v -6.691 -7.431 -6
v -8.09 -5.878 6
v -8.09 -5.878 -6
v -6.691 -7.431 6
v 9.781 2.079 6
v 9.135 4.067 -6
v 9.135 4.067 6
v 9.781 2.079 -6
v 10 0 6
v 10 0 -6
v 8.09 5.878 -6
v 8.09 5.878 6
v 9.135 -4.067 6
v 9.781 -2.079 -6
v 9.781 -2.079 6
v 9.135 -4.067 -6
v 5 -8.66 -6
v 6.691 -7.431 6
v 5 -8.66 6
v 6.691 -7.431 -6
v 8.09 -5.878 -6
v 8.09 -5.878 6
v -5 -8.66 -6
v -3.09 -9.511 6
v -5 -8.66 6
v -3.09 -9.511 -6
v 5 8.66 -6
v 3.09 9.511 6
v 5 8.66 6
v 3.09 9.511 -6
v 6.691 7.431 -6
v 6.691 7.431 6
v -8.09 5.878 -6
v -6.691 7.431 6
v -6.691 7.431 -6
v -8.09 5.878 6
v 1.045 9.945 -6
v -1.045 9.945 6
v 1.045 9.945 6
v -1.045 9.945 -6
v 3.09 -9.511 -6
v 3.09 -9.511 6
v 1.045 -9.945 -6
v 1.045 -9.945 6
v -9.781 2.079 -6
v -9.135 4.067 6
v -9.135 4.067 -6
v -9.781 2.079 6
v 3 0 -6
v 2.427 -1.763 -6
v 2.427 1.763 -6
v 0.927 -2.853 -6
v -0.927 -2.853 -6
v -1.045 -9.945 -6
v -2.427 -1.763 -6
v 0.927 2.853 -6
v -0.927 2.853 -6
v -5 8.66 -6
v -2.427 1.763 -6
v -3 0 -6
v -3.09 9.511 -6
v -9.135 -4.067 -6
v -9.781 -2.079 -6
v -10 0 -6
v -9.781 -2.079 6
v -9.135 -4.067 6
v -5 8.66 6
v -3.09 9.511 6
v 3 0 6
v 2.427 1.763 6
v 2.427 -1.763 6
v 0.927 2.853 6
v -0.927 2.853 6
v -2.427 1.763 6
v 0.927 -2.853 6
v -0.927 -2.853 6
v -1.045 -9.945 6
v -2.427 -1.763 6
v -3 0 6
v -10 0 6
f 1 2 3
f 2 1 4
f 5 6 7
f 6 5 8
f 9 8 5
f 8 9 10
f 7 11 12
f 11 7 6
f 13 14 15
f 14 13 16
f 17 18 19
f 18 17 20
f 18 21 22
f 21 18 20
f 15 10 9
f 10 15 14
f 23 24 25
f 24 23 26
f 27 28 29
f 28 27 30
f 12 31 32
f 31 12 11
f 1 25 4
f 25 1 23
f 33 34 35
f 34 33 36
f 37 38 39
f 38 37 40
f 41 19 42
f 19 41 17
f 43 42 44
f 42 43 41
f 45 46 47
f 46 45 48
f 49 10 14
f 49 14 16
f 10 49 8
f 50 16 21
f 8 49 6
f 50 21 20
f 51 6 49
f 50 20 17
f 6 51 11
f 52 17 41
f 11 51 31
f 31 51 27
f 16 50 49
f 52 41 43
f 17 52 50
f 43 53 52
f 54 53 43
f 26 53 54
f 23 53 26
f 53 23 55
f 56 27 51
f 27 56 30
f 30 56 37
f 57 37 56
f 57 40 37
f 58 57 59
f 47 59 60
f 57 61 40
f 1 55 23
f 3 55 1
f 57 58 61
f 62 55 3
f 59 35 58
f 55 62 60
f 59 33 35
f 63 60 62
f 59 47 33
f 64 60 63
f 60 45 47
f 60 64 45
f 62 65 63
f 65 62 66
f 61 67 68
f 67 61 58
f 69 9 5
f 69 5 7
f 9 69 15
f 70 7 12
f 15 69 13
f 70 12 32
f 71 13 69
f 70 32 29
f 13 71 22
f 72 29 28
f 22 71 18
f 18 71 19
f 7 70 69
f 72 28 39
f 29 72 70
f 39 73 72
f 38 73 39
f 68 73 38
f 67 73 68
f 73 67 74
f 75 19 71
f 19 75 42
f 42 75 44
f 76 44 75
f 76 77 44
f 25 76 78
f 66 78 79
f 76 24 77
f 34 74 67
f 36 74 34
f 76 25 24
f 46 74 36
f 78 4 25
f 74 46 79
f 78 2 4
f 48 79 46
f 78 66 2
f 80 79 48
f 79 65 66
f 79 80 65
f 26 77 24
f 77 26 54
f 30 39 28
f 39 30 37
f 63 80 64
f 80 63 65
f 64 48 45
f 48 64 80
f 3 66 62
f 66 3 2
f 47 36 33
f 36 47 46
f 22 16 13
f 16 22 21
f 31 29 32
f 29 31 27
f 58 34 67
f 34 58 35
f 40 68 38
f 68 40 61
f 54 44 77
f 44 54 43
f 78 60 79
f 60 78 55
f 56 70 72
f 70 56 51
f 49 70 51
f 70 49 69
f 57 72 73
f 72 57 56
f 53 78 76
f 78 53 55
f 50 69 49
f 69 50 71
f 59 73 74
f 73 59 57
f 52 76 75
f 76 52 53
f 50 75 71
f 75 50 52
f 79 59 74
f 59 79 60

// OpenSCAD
difference() {
    cylinder(h = 12, d = 20, center = true);          // main body
    cylinder(h = 14, d = 6, center = true);            // central hole (slightly taller to ensure clean cut)
}
